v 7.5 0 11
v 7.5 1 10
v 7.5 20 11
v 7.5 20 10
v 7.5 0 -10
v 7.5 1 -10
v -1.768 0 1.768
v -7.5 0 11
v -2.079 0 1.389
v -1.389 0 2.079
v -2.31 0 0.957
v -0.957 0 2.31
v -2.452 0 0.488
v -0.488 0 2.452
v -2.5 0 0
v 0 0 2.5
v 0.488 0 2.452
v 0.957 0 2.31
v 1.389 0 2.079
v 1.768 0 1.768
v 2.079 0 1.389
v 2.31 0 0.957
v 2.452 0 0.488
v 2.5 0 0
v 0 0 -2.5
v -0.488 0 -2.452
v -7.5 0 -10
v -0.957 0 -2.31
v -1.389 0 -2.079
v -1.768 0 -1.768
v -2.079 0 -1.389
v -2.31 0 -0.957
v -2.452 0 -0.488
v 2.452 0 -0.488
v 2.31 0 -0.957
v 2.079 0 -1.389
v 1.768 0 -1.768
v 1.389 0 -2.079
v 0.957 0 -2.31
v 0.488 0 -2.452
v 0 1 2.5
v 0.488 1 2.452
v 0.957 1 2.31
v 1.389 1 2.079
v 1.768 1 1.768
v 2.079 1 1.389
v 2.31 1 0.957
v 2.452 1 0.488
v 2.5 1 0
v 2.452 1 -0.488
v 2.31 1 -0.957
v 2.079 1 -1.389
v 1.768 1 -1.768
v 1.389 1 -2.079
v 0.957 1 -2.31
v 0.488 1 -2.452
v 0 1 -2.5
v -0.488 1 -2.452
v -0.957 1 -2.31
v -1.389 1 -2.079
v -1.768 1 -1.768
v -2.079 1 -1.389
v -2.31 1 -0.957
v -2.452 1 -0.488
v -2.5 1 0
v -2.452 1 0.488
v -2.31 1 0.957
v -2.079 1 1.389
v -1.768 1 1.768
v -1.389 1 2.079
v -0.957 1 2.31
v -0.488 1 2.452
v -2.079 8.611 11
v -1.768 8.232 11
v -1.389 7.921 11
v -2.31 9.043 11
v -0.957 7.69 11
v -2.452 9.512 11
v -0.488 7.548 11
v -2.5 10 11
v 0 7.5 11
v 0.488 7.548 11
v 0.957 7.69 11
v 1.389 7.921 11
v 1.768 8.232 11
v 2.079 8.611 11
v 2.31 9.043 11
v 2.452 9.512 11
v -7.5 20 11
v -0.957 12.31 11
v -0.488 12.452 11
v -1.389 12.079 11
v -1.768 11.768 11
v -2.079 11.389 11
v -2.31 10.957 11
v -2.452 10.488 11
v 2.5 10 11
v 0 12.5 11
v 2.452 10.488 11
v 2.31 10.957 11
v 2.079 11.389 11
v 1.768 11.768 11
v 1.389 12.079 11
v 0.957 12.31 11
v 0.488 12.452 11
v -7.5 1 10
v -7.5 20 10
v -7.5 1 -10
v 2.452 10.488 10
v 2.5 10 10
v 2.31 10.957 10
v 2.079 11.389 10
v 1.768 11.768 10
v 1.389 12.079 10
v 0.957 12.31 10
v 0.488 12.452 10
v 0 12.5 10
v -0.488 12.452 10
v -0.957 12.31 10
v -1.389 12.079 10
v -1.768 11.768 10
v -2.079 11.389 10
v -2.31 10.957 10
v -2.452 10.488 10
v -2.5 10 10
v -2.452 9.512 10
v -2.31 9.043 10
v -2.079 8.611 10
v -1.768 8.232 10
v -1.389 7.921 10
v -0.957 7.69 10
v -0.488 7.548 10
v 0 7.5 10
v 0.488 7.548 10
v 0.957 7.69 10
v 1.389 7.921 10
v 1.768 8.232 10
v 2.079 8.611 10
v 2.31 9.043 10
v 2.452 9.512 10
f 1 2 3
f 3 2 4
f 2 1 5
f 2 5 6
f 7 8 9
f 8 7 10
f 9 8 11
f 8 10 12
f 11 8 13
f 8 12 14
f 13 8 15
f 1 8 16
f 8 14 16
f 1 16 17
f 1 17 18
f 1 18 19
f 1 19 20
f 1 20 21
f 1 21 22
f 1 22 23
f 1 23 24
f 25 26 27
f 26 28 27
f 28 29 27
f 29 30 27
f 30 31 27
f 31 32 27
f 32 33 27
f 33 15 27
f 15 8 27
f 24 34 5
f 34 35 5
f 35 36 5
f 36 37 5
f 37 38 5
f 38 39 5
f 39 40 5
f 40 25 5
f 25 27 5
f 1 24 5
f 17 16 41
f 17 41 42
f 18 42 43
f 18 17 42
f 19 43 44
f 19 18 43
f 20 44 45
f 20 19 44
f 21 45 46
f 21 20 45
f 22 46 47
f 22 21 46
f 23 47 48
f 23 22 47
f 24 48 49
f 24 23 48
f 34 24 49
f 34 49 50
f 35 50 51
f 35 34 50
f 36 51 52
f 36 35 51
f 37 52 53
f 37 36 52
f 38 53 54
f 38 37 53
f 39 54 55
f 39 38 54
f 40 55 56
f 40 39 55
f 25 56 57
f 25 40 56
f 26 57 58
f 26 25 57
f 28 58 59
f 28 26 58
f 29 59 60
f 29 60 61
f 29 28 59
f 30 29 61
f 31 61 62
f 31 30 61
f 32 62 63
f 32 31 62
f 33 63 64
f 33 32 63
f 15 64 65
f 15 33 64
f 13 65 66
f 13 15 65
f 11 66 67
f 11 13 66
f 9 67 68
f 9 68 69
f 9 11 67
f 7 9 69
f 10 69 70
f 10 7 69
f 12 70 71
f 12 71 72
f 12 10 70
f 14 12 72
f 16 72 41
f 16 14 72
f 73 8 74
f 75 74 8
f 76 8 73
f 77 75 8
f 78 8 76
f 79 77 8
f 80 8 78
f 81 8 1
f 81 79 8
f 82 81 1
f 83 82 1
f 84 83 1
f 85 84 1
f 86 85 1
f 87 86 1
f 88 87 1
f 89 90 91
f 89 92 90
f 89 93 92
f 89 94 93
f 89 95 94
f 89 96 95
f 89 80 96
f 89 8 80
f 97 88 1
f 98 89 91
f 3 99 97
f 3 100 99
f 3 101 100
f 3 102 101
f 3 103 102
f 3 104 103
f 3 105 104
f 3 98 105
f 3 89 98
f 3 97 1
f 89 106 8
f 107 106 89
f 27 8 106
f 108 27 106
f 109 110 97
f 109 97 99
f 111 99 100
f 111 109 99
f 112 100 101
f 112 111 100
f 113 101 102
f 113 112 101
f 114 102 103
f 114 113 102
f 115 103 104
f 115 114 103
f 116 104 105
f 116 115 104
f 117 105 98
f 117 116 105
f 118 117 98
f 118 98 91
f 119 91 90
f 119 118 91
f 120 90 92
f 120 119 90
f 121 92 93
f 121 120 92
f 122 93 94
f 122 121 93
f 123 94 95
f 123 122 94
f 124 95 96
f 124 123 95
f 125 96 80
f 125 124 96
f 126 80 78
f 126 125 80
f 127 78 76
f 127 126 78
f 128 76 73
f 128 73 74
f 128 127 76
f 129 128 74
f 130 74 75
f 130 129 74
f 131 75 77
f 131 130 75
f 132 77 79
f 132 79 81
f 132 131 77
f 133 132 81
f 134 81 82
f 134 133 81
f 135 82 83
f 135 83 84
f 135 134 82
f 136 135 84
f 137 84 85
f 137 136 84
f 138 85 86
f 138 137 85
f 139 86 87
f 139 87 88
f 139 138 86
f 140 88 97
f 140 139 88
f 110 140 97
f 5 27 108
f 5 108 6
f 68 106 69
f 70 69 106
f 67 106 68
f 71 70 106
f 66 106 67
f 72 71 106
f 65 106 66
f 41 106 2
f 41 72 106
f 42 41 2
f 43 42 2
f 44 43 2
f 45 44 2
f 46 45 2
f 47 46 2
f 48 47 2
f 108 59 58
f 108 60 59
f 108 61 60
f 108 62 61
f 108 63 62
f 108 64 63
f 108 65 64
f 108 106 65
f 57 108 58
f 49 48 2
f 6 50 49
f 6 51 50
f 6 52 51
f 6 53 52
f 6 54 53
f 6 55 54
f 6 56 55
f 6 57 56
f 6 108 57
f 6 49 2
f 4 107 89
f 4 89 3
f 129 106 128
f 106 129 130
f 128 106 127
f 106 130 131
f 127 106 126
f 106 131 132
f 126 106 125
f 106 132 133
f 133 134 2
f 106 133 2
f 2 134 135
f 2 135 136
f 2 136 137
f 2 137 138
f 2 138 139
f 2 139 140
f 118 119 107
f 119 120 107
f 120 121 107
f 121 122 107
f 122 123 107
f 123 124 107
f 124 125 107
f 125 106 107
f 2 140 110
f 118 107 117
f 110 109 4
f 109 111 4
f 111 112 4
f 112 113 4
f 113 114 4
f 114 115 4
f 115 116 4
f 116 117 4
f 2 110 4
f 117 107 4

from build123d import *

# Parameters (mm, degrees)
SKETCH1_W           = 15
SKETCH1_H           = 20
SKETCH1_R           = 2.5
BOSS_EXTRUDE1_DEPTH = 1
SKETCH2_W           = 15
SKETCH2_H           = 20
SKETCH2_R           = 2.5
BOSS_EXTRUDE2_DEPTH = 1


with BuildPart() as part:
    # Sketch1 → Boss-Extrude1 (new body)
    with BuildSketch(Plane(origin=(0, 0, 0), x_dir=(1, 0, 0), z_dir=(0, 1, 0))):
        Rectangle(SKETCH1_W, SKETCH1_H)
        with Locations(Location((0, 0, 0), (0, 0, 270))):
            Circle(SKETCH1_R, mode=Mode.SUBTRACT)
    extrude(amount=BOSS_EXTRUDE1_DEPTH)

    # Sketch2 → Boss-Extrude2 (add)
    with BuildSketch(Plane.XY.offset(10)):
        with Locations((0, 10)):
            Rectangle(SKETCH2_W, SKETCH2_H)
        with Locations((0, 10)):
            Circle(SKETCH2_R, mode=Mode.SUBTRACT)
    extrude(amount=BOSS_EXTRUDE2_DEPTH)


solid = part.part
